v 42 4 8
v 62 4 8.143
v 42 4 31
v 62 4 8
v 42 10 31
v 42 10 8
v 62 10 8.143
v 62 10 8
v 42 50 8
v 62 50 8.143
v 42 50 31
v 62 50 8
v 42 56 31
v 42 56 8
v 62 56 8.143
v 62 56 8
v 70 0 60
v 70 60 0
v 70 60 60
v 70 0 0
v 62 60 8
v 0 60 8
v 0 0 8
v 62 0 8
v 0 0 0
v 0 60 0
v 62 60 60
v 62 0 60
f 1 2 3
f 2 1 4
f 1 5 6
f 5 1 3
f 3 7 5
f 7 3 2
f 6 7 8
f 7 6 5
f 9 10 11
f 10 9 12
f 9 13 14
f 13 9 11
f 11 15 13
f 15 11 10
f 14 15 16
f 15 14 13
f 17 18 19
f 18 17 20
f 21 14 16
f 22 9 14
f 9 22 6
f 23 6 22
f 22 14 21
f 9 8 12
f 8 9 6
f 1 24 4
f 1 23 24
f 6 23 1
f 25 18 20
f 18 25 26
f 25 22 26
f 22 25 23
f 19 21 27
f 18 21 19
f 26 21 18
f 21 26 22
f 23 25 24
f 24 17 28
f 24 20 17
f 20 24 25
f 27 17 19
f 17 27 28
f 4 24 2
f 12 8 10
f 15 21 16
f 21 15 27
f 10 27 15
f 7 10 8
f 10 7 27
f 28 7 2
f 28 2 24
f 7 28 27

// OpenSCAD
$fn = 32;

// ----------------------------------------------------------------------
// Rib bracket: 2-gusset L bracket
// ----------------------------------------------------------------------

// --- parameters (mm) ---
base_l = 70;              // foot length, X
base_w = 60;              // foot width, Y
base_t = 8;               // foot thickness
plate_t = 8;              // upright plate thickness
plate_h = 60;             // overall height
gus_l = 20;               // gusset leg along the foot
gus_h = 24;               // gusset height
gus_t = 6;                // gusset thickness
gus_edge = 4;             // gusset margin from the foot edge
n_gus = 2;                // gusset count

gus_pitch = (base_w - 2 * gus_edge - gus_t) / (n_gus - 1);  // gusset pitch

union() {
  cube([base_l, base_w, base_t]);
  translate([base_l - plate_t, 0, base_t - 1])
    cube([plate_t, base_w, plate_h - base_t + 1]);
  for (i = [0 : n_gus - 1])
    translate([base_l - plate_t - gus_l, gus_edge + i * gus_pitch, base_t - 1])
      rotate([-90, 0, 0])
        linear_extrude(height = gus_t)
          polygon(points = [[0, 0], [gus_l + 1, 0], [0, -gus_h]]);
}
